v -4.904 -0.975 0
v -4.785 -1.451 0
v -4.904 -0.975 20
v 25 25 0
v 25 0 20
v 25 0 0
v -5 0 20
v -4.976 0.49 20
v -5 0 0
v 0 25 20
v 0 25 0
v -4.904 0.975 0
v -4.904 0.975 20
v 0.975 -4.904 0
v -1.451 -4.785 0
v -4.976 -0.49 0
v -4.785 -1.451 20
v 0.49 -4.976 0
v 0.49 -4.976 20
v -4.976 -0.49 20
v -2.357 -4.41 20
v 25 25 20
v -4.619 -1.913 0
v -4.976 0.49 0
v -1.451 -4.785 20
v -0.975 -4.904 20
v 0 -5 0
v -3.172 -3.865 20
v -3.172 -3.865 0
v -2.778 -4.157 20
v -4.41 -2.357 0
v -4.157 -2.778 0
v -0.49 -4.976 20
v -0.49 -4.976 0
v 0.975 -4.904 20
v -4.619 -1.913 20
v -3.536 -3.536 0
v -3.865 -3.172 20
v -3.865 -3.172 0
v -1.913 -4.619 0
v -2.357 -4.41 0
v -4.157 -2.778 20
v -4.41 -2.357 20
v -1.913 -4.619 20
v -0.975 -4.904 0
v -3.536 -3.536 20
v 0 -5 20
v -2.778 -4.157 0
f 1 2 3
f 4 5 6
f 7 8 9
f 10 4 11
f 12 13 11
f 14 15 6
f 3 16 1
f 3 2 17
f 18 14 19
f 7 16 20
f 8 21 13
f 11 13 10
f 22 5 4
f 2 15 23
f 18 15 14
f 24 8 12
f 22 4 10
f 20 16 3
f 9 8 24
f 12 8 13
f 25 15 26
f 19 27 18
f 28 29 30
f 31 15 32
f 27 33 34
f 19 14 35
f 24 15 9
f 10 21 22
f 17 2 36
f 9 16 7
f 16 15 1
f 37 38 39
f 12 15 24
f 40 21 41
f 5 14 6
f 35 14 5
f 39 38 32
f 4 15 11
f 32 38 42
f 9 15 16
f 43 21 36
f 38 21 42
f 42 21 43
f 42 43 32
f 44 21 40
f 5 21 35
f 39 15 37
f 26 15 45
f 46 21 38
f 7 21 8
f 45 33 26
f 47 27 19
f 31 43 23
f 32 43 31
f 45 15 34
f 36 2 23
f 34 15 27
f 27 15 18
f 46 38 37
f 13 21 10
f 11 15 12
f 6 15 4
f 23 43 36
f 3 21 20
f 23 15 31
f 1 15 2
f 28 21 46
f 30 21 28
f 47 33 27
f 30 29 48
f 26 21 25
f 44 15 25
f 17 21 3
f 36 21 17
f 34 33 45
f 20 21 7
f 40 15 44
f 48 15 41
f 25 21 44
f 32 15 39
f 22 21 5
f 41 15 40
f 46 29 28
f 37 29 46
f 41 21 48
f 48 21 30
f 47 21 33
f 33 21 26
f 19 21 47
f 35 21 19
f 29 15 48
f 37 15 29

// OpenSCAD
$fn=64;
hull(){cylinder(h = 20, r = 5.000);
cube(size = [25, 25, 20]);
}
